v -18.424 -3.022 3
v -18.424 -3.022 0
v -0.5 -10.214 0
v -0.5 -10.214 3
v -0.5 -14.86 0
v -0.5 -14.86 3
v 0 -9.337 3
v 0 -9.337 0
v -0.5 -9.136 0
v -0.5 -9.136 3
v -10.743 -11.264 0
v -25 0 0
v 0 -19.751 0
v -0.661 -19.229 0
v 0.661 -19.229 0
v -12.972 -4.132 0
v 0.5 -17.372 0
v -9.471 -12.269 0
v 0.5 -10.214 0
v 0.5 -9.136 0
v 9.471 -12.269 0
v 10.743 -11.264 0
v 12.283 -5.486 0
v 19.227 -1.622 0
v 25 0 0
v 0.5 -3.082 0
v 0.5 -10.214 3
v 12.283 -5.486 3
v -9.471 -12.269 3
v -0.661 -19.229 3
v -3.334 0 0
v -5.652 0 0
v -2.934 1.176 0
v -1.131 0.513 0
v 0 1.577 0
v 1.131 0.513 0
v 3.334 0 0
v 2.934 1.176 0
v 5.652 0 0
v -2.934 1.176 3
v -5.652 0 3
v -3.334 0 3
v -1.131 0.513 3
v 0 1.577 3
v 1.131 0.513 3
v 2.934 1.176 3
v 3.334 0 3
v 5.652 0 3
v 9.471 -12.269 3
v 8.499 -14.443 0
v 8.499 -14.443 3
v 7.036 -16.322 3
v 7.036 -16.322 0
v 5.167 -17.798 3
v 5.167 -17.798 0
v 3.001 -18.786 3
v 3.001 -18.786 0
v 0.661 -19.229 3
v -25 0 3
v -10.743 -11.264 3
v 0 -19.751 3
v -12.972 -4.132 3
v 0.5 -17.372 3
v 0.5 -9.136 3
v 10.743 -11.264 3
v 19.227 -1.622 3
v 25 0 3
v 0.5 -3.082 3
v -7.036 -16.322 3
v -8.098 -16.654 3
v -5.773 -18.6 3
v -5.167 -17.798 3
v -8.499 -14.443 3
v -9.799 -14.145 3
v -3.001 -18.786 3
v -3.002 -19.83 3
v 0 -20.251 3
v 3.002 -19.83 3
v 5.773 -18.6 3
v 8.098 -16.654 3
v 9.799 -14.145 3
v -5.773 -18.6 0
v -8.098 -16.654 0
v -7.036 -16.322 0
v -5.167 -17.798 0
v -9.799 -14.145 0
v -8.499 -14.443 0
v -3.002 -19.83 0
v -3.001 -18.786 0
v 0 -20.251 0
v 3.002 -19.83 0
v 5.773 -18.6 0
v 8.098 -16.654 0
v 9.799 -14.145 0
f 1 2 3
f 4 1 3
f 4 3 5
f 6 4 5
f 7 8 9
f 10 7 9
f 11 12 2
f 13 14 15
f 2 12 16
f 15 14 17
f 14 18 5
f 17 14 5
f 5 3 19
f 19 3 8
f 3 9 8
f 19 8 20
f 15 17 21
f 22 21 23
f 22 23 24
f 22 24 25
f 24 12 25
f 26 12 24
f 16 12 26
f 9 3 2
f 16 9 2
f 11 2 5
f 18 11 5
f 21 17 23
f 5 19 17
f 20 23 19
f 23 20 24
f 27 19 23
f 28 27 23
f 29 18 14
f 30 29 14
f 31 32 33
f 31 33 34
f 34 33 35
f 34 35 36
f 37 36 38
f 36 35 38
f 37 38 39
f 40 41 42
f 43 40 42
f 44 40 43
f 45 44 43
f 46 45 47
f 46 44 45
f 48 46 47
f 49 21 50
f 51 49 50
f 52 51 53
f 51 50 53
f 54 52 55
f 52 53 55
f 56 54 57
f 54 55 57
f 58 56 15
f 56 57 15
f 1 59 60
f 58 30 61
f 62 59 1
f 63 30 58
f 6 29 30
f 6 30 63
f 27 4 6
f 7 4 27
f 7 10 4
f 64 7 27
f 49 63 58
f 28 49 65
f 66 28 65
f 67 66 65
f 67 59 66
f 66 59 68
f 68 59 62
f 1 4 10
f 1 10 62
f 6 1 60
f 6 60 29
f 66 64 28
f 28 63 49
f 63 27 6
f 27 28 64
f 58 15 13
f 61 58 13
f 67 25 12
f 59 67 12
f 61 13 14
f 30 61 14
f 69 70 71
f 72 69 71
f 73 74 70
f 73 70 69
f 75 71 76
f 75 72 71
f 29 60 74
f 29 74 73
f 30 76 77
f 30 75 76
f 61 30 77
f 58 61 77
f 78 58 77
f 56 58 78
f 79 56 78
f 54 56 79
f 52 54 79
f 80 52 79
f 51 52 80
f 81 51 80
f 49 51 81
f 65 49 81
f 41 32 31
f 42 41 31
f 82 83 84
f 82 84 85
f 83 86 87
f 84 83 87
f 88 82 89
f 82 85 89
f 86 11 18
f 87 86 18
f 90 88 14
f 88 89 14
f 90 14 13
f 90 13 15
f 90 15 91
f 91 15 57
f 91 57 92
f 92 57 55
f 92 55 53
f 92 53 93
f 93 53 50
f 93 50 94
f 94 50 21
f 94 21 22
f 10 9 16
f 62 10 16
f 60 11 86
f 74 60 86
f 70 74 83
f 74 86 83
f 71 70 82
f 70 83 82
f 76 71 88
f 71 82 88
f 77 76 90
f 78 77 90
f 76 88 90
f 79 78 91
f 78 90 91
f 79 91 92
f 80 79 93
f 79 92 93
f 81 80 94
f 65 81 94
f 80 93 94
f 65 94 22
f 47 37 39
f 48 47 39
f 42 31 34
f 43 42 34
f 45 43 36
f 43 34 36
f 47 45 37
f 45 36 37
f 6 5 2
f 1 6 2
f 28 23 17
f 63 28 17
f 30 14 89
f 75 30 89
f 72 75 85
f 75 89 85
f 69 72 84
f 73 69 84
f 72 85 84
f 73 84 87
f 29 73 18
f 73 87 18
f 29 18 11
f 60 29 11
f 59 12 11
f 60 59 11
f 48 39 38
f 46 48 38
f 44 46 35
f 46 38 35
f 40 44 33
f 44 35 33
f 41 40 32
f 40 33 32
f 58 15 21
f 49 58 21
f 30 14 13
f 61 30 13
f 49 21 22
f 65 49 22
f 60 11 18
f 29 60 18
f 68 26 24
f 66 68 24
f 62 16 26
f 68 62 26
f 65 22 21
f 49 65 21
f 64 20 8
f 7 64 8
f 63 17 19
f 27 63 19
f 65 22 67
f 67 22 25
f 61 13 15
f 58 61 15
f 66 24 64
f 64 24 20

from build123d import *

# Parameters (mm, degrees)
F1_DEPTH = 3
F2_DEPTH = 3
F3_DEPTH = 3


# Not quite as in the source:
# - a feature names something its author has since deleted; it is built from what else it names


with BuildPart() as f1:
    # F0 (on Top) → F1 (new body)
    with BuildSketch(Plane.XY):
        Polygon((3.3342897613, 0), (0, 0), (-3.3342897613, 0), (-5.6521106464, 0), (-25, 0), (-10.7429983194, -11.263816016), (-9.4710395464, -12.2687334537), (-0.6607687547, -19.2293322859), (0, -19.7513759701), (0.6607687547, -19.2293322859), (9.4710395464, -12.2687334537), (10.7429983194, -11.263816016), (25, 0), (5.6521106464, 0), align=None)
        Polygon((-20.7355933027, -2.094680059), (-22.1211677314, -1), (-20.7784352121, -1), (0, -1), (14.3438164741, -1), (20.7784352121, -1), (22.1211677314, -1), (20.7355933027, -2.094680059), (3.7483545568, -15.5155336256), (0.5, -18.081912511), (0, -18.4769400304), (-0.5, -18.081912511), (-16.112200225, -5.7474150564), align=None, mode=Mode.SUBTRACT)
        Polygon((0.5, -17.3717289222), (0.5, -18.081912511), (3.7483545568, -15.5155336256), (14.6217098136, -4.5477568082), (12.2834767919, -5.4859272967), align=None)
        Polygon((-0.5, -16.0585195866), (-0.5, -18.081912511), (0, -18.4769400304), (0.5, -18.081912511), (0.5, -17.3717289222), (0.5, -10.2138180054), (0.5, -9.1363274287), (0, -9.3369426967), (-0.5, -9.1363274287), (-0.5, -10.2138180054), (-0.5, -14.8601054354), align=None)
        Polygon((22.1211677314, -1), (20.7784352121, -1), (19.2271466743, -1.6224243315), (0.5, -9.1363274287), (0.5, -10.2138180054), (12.2834767919, -5.4859272967), (14.6217098136, -4.5477568082), (20.7355933027, -2.094680059), align=None)
        Polygon((20.7784352121, -1), (14.3438164741, -1), (0.5, -2.0789917684), (0.5, -3.0820245179), (19.2271466743, -1.6224243315), align=None)
        Polygon((0.5, -2.0789917684), (-0.5, -2.1569321088), (-0.5, -3.1599648583), (0.5, -3.0820245179), align=None)
        Polygon((-0.5, -2.1569321088), (-15.0655666155, -3.2921773289), (-12.9722992677, -4.1320601088), (-0.5, -3.1599648583), align=None)
        Polygon((-20.7784352121, -1), (-22.1211677314, -1), (-20.7355933027, -2.094680059), (-18.4240265529, -3.022151225), (-0.5, -10.2138180054), (-0.5, -9.1363274287), (-12.9722992677, -4.1320601088), (-15.0655666155, -3.2921773289), align=None)
        Polygon((-18.4240265529, -3.022151225), (-20.7355933027, -2.094680059), (-16.112200225, -5.7474150564), (-0.5, -16.0585195866), (-0.5, -14.8601054354), align=None)
    extrude(amount=F1_DEPTH)

    # F0 (on Top) → F2 (join)
    with BuildSketch(Plane.XY):
        Polygon((0, -1), (-20.7784352121, -1), (-15.0655666155, -3.2921773289), (-0.5, -2.1569321088), (0.5, -2.0789917684), (14.3438164741, -1), align=None)
        Polygon((3.7483545568, -15.5155336256), (20.7355933027, -2.094680059), (14.6217098136, -4.5477568082), align=None)
        Polygon((-0.5, -16.0585195866), (-16.112200225, -5.7474150564), (-0.5, -18.081912511), align=None)
    extrude(amount=F2_DEPTH)


with BuildPart() as f3:
    # F0 (on Top) → F3 (new body)
    with BuildSketch(Plane.XY):
        with BuildLine():
            ThreePointArc((-3.3342897613, 0), (0, 0.5774905768), (3.3342897613, 0))
            Line((3.3342897613, 0), (5.6521106464, 0))
            ThreePointArc((5.6521106464, 0), (0, 1.5774905768), (-5.6521106464, 0))
            Line((-5.6521106464, 0), (-3.3342897613, 0))
        make_face()
    extrude(amount=F3_DEPTH)


with BuildPart() as f3b:
    # F0 (on Top) → F3, piece 2 (new body)
    with BuildSketch(Plane.XY):
        with BuildLine():
            ThreePointArc((-10.7429983194, -11.263816016), (0, -20.2513759701), (10.7429983194, -11.263816016))
            Line((10.7429983194, -11.263816016), (9.4710395464, -12.2687334537))
            ThreePointArc((9.4710395464, -12.2687334537), (6.1462076835, -17.116410432), (0.6607687547, -19.2293322859))
            Line((0.6607687547, -19.2293322859), (0, -19.7513759701))
            Line((0, -19.7513759701), (-0.6607687547, -19.2293322859))
            ThreePointArc((-0.6607687547, -19.2293322859), (-6.1462076835, -17.116410432), (-9.4710395464, -12.2687334537))
            Line((-9.4710395464, -12.2687334537), (-10.7429983194, -11.263816016))
        make_face()
    extrude(amount=F3_DEPTH)


solid = Compound([f1.part, f3.part, f3b.part])
